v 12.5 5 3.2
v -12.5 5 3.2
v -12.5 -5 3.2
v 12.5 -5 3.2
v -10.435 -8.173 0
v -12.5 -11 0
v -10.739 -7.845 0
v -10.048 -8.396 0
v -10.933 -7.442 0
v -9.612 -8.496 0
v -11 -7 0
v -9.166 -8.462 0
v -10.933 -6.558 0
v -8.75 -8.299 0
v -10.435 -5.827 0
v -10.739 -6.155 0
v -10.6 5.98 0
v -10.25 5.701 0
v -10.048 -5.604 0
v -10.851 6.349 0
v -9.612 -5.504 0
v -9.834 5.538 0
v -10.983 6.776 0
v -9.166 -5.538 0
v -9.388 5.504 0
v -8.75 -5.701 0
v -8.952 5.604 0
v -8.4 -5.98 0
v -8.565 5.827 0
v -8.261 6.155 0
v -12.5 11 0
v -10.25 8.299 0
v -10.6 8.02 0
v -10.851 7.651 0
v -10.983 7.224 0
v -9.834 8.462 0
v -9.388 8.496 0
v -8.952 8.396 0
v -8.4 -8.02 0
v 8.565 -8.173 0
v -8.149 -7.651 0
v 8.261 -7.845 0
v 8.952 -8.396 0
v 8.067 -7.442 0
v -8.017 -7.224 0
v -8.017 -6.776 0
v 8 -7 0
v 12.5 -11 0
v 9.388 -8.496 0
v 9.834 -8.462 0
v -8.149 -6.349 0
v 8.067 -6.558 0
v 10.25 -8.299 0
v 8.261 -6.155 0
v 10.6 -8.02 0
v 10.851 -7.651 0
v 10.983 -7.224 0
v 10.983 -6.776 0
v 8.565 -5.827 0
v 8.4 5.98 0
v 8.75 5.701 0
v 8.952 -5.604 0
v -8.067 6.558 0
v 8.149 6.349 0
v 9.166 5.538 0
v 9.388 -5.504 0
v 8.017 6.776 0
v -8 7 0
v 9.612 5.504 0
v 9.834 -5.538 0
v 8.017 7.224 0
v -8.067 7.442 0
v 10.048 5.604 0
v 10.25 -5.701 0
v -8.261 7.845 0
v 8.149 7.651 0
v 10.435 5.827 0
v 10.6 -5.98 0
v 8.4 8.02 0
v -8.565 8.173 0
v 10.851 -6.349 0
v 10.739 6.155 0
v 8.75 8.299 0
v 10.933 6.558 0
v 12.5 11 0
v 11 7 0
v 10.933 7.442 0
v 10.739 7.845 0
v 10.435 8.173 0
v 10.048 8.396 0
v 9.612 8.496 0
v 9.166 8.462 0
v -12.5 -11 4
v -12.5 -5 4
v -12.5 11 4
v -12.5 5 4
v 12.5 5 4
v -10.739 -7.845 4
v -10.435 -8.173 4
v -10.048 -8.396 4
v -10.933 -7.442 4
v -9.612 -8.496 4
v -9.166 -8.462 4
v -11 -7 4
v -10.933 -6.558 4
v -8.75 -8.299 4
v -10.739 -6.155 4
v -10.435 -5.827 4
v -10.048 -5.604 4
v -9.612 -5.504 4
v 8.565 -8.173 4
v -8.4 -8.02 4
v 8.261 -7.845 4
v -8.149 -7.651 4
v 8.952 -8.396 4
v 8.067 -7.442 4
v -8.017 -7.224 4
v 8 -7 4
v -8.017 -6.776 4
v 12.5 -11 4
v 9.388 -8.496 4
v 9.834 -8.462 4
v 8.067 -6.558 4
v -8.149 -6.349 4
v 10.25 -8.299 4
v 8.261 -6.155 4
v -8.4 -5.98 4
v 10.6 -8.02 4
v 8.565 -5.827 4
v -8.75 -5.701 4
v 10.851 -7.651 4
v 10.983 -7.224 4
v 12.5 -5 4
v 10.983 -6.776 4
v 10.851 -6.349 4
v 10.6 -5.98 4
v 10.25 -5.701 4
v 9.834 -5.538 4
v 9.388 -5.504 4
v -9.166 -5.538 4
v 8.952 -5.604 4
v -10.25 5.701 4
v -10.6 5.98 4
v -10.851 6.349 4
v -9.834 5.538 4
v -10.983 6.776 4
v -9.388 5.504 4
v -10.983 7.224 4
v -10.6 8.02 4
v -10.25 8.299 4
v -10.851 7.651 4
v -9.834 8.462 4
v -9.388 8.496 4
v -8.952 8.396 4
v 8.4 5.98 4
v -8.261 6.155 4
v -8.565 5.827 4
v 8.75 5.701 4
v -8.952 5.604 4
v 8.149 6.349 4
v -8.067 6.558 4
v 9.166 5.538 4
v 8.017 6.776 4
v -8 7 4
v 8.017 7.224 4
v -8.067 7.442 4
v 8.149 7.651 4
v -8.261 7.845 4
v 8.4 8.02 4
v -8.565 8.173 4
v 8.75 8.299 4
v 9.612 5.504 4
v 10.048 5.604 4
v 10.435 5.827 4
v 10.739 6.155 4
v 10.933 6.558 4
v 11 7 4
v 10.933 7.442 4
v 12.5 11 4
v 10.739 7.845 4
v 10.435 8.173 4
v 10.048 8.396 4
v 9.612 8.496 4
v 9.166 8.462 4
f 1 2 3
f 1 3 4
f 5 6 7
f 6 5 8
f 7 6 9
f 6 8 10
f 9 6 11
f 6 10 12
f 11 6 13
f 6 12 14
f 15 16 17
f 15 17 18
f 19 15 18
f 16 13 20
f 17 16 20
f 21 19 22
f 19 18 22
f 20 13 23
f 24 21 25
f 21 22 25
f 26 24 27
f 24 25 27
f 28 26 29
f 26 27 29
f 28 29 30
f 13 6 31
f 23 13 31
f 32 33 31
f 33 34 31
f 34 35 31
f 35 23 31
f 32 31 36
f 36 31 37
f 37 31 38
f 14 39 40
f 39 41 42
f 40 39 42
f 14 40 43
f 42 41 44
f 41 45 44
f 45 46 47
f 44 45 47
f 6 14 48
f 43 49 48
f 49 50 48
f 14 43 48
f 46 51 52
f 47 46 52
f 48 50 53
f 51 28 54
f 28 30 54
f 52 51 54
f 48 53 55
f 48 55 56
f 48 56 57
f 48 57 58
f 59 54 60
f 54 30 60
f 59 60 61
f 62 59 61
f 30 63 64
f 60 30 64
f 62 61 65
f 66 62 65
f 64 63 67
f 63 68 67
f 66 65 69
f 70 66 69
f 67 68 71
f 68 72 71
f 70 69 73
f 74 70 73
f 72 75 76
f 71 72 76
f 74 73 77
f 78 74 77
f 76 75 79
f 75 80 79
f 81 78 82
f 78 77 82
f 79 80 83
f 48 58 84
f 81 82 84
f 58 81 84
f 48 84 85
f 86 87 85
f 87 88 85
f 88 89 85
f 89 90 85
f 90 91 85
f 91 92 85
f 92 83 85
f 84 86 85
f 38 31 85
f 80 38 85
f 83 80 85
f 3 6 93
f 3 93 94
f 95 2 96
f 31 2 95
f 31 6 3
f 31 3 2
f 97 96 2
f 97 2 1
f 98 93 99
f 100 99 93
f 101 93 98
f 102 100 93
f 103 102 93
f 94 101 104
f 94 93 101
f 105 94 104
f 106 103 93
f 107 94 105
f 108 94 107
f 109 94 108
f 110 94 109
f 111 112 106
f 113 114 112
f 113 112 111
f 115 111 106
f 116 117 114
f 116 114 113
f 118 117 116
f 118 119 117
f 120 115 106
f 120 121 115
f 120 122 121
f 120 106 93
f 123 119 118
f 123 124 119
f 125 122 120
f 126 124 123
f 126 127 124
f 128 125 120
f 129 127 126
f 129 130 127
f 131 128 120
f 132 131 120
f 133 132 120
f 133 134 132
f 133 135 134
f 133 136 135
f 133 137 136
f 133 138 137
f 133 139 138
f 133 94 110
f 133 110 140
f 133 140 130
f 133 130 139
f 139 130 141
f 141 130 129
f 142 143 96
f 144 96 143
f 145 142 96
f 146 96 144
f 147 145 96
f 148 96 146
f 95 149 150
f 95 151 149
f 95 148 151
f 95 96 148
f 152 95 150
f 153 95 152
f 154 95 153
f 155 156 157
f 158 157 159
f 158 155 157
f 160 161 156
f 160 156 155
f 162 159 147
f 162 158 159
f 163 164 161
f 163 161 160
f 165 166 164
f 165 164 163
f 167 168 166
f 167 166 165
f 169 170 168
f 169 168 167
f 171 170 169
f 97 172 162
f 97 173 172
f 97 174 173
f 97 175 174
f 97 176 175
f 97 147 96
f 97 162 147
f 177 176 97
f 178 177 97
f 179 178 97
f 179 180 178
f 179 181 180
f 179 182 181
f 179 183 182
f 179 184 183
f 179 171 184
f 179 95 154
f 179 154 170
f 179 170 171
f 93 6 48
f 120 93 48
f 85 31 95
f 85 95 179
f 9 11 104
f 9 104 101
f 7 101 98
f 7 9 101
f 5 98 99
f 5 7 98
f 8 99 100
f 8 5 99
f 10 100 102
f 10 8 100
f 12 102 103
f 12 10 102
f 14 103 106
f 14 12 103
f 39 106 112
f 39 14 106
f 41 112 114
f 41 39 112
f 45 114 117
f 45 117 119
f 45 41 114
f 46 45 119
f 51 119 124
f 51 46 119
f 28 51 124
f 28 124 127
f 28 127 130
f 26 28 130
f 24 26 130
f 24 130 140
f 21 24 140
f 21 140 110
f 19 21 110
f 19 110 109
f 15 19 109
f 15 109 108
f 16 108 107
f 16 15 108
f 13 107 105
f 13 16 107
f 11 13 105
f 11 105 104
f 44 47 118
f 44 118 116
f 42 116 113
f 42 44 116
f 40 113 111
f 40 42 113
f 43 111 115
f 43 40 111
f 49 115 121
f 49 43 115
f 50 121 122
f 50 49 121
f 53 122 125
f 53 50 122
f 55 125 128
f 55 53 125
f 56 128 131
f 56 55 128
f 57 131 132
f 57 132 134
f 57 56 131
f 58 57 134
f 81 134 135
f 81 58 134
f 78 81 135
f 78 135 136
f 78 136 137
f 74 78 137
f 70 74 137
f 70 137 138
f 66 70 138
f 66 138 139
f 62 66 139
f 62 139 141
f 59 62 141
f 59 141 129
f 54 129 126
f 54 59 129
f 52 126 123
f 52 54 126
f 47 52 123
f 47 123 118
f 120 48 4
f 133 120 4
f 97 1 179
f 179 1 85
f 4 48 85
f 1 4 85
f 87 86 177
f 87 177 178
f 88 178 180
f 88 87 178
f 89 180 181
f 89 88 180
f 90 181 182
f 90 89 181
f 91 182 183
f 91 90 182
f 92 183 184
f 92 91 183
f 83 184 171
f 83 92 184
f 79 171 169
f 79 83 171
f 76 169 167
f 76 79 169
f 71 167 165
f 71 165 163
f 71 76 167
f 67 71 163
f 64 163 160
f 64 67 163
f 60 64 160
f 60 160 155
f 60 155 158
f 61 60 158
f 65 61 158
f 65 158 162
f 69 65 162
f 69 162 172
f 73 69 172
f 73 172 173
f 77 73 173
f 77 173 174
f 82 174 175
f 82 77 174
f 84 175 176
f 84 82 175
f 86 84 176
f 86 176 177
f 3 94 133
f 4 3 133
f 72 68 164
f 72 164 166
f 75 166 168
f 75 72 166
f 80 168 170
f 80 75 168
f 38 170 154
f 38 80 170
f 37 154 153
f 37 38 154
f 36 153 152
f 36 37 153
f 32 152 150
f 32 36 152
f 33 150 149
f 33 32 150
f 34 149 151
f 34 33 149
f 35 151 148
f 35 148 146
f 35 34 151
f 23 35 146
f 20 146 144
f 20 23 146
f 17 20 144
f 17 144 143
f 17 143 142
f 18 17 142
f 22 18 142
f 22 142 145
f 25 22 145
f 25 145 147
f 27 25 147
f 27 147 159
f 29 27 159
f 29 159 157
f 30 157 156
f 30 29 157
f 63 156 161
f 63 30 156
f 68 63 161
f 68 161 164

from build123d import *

# Parameters (mm, degrees)
SKETCH_1_W          = 25
SKETCH_1_H          = 22
SKETCH_1_R          = 1.5
EXTRUDE_1_DEPTH     = 4
SKETCH_2_W          = 25
SKETCH_2_H          = 10
CUT_EXTRUDE_1_DEPTH = 0.8


with BuildPart() as part:
    # 草图1 → 凸台-拉伸1 (new body)
    with BuildSketch(Plane.XY):
        Rectangle(SKETCH_1_W, SKETCH_1_H)
        with Locations((-9.5, 7)):
            Circle(SKETCH_1_R, mode=Mode.SUBTRACT)
        with Locations((9.5, 7)):
            Circle(SKETCH_1_R, mode=Mode.SUBTRACT)
        with Locations(Location((9.5, -7, 0), (0, 0, 180))):
            Circle(SKETCH_1_R, mode=Mode.SUBTRACT)
        with Locations(Location((-9.5, -7, 0), (0, 0, 180))):
            Circle(SKETCH_1_R, mode=Mode.SUBTRACT)
    extrude(amount=EXTRUDE_1_DEPTH)

    # 草图2 → 切除-拉伸1 (cut)
    with BuildSketch(Plane.XY.offset(4)):
        Rectangle(SKETCH_2_W, SKETCH_2_H)
    extrude(amount=-CUT_EXTRUDE_1_DEPTH, mode=Mode.SUBTRACT)


solid = part.part
